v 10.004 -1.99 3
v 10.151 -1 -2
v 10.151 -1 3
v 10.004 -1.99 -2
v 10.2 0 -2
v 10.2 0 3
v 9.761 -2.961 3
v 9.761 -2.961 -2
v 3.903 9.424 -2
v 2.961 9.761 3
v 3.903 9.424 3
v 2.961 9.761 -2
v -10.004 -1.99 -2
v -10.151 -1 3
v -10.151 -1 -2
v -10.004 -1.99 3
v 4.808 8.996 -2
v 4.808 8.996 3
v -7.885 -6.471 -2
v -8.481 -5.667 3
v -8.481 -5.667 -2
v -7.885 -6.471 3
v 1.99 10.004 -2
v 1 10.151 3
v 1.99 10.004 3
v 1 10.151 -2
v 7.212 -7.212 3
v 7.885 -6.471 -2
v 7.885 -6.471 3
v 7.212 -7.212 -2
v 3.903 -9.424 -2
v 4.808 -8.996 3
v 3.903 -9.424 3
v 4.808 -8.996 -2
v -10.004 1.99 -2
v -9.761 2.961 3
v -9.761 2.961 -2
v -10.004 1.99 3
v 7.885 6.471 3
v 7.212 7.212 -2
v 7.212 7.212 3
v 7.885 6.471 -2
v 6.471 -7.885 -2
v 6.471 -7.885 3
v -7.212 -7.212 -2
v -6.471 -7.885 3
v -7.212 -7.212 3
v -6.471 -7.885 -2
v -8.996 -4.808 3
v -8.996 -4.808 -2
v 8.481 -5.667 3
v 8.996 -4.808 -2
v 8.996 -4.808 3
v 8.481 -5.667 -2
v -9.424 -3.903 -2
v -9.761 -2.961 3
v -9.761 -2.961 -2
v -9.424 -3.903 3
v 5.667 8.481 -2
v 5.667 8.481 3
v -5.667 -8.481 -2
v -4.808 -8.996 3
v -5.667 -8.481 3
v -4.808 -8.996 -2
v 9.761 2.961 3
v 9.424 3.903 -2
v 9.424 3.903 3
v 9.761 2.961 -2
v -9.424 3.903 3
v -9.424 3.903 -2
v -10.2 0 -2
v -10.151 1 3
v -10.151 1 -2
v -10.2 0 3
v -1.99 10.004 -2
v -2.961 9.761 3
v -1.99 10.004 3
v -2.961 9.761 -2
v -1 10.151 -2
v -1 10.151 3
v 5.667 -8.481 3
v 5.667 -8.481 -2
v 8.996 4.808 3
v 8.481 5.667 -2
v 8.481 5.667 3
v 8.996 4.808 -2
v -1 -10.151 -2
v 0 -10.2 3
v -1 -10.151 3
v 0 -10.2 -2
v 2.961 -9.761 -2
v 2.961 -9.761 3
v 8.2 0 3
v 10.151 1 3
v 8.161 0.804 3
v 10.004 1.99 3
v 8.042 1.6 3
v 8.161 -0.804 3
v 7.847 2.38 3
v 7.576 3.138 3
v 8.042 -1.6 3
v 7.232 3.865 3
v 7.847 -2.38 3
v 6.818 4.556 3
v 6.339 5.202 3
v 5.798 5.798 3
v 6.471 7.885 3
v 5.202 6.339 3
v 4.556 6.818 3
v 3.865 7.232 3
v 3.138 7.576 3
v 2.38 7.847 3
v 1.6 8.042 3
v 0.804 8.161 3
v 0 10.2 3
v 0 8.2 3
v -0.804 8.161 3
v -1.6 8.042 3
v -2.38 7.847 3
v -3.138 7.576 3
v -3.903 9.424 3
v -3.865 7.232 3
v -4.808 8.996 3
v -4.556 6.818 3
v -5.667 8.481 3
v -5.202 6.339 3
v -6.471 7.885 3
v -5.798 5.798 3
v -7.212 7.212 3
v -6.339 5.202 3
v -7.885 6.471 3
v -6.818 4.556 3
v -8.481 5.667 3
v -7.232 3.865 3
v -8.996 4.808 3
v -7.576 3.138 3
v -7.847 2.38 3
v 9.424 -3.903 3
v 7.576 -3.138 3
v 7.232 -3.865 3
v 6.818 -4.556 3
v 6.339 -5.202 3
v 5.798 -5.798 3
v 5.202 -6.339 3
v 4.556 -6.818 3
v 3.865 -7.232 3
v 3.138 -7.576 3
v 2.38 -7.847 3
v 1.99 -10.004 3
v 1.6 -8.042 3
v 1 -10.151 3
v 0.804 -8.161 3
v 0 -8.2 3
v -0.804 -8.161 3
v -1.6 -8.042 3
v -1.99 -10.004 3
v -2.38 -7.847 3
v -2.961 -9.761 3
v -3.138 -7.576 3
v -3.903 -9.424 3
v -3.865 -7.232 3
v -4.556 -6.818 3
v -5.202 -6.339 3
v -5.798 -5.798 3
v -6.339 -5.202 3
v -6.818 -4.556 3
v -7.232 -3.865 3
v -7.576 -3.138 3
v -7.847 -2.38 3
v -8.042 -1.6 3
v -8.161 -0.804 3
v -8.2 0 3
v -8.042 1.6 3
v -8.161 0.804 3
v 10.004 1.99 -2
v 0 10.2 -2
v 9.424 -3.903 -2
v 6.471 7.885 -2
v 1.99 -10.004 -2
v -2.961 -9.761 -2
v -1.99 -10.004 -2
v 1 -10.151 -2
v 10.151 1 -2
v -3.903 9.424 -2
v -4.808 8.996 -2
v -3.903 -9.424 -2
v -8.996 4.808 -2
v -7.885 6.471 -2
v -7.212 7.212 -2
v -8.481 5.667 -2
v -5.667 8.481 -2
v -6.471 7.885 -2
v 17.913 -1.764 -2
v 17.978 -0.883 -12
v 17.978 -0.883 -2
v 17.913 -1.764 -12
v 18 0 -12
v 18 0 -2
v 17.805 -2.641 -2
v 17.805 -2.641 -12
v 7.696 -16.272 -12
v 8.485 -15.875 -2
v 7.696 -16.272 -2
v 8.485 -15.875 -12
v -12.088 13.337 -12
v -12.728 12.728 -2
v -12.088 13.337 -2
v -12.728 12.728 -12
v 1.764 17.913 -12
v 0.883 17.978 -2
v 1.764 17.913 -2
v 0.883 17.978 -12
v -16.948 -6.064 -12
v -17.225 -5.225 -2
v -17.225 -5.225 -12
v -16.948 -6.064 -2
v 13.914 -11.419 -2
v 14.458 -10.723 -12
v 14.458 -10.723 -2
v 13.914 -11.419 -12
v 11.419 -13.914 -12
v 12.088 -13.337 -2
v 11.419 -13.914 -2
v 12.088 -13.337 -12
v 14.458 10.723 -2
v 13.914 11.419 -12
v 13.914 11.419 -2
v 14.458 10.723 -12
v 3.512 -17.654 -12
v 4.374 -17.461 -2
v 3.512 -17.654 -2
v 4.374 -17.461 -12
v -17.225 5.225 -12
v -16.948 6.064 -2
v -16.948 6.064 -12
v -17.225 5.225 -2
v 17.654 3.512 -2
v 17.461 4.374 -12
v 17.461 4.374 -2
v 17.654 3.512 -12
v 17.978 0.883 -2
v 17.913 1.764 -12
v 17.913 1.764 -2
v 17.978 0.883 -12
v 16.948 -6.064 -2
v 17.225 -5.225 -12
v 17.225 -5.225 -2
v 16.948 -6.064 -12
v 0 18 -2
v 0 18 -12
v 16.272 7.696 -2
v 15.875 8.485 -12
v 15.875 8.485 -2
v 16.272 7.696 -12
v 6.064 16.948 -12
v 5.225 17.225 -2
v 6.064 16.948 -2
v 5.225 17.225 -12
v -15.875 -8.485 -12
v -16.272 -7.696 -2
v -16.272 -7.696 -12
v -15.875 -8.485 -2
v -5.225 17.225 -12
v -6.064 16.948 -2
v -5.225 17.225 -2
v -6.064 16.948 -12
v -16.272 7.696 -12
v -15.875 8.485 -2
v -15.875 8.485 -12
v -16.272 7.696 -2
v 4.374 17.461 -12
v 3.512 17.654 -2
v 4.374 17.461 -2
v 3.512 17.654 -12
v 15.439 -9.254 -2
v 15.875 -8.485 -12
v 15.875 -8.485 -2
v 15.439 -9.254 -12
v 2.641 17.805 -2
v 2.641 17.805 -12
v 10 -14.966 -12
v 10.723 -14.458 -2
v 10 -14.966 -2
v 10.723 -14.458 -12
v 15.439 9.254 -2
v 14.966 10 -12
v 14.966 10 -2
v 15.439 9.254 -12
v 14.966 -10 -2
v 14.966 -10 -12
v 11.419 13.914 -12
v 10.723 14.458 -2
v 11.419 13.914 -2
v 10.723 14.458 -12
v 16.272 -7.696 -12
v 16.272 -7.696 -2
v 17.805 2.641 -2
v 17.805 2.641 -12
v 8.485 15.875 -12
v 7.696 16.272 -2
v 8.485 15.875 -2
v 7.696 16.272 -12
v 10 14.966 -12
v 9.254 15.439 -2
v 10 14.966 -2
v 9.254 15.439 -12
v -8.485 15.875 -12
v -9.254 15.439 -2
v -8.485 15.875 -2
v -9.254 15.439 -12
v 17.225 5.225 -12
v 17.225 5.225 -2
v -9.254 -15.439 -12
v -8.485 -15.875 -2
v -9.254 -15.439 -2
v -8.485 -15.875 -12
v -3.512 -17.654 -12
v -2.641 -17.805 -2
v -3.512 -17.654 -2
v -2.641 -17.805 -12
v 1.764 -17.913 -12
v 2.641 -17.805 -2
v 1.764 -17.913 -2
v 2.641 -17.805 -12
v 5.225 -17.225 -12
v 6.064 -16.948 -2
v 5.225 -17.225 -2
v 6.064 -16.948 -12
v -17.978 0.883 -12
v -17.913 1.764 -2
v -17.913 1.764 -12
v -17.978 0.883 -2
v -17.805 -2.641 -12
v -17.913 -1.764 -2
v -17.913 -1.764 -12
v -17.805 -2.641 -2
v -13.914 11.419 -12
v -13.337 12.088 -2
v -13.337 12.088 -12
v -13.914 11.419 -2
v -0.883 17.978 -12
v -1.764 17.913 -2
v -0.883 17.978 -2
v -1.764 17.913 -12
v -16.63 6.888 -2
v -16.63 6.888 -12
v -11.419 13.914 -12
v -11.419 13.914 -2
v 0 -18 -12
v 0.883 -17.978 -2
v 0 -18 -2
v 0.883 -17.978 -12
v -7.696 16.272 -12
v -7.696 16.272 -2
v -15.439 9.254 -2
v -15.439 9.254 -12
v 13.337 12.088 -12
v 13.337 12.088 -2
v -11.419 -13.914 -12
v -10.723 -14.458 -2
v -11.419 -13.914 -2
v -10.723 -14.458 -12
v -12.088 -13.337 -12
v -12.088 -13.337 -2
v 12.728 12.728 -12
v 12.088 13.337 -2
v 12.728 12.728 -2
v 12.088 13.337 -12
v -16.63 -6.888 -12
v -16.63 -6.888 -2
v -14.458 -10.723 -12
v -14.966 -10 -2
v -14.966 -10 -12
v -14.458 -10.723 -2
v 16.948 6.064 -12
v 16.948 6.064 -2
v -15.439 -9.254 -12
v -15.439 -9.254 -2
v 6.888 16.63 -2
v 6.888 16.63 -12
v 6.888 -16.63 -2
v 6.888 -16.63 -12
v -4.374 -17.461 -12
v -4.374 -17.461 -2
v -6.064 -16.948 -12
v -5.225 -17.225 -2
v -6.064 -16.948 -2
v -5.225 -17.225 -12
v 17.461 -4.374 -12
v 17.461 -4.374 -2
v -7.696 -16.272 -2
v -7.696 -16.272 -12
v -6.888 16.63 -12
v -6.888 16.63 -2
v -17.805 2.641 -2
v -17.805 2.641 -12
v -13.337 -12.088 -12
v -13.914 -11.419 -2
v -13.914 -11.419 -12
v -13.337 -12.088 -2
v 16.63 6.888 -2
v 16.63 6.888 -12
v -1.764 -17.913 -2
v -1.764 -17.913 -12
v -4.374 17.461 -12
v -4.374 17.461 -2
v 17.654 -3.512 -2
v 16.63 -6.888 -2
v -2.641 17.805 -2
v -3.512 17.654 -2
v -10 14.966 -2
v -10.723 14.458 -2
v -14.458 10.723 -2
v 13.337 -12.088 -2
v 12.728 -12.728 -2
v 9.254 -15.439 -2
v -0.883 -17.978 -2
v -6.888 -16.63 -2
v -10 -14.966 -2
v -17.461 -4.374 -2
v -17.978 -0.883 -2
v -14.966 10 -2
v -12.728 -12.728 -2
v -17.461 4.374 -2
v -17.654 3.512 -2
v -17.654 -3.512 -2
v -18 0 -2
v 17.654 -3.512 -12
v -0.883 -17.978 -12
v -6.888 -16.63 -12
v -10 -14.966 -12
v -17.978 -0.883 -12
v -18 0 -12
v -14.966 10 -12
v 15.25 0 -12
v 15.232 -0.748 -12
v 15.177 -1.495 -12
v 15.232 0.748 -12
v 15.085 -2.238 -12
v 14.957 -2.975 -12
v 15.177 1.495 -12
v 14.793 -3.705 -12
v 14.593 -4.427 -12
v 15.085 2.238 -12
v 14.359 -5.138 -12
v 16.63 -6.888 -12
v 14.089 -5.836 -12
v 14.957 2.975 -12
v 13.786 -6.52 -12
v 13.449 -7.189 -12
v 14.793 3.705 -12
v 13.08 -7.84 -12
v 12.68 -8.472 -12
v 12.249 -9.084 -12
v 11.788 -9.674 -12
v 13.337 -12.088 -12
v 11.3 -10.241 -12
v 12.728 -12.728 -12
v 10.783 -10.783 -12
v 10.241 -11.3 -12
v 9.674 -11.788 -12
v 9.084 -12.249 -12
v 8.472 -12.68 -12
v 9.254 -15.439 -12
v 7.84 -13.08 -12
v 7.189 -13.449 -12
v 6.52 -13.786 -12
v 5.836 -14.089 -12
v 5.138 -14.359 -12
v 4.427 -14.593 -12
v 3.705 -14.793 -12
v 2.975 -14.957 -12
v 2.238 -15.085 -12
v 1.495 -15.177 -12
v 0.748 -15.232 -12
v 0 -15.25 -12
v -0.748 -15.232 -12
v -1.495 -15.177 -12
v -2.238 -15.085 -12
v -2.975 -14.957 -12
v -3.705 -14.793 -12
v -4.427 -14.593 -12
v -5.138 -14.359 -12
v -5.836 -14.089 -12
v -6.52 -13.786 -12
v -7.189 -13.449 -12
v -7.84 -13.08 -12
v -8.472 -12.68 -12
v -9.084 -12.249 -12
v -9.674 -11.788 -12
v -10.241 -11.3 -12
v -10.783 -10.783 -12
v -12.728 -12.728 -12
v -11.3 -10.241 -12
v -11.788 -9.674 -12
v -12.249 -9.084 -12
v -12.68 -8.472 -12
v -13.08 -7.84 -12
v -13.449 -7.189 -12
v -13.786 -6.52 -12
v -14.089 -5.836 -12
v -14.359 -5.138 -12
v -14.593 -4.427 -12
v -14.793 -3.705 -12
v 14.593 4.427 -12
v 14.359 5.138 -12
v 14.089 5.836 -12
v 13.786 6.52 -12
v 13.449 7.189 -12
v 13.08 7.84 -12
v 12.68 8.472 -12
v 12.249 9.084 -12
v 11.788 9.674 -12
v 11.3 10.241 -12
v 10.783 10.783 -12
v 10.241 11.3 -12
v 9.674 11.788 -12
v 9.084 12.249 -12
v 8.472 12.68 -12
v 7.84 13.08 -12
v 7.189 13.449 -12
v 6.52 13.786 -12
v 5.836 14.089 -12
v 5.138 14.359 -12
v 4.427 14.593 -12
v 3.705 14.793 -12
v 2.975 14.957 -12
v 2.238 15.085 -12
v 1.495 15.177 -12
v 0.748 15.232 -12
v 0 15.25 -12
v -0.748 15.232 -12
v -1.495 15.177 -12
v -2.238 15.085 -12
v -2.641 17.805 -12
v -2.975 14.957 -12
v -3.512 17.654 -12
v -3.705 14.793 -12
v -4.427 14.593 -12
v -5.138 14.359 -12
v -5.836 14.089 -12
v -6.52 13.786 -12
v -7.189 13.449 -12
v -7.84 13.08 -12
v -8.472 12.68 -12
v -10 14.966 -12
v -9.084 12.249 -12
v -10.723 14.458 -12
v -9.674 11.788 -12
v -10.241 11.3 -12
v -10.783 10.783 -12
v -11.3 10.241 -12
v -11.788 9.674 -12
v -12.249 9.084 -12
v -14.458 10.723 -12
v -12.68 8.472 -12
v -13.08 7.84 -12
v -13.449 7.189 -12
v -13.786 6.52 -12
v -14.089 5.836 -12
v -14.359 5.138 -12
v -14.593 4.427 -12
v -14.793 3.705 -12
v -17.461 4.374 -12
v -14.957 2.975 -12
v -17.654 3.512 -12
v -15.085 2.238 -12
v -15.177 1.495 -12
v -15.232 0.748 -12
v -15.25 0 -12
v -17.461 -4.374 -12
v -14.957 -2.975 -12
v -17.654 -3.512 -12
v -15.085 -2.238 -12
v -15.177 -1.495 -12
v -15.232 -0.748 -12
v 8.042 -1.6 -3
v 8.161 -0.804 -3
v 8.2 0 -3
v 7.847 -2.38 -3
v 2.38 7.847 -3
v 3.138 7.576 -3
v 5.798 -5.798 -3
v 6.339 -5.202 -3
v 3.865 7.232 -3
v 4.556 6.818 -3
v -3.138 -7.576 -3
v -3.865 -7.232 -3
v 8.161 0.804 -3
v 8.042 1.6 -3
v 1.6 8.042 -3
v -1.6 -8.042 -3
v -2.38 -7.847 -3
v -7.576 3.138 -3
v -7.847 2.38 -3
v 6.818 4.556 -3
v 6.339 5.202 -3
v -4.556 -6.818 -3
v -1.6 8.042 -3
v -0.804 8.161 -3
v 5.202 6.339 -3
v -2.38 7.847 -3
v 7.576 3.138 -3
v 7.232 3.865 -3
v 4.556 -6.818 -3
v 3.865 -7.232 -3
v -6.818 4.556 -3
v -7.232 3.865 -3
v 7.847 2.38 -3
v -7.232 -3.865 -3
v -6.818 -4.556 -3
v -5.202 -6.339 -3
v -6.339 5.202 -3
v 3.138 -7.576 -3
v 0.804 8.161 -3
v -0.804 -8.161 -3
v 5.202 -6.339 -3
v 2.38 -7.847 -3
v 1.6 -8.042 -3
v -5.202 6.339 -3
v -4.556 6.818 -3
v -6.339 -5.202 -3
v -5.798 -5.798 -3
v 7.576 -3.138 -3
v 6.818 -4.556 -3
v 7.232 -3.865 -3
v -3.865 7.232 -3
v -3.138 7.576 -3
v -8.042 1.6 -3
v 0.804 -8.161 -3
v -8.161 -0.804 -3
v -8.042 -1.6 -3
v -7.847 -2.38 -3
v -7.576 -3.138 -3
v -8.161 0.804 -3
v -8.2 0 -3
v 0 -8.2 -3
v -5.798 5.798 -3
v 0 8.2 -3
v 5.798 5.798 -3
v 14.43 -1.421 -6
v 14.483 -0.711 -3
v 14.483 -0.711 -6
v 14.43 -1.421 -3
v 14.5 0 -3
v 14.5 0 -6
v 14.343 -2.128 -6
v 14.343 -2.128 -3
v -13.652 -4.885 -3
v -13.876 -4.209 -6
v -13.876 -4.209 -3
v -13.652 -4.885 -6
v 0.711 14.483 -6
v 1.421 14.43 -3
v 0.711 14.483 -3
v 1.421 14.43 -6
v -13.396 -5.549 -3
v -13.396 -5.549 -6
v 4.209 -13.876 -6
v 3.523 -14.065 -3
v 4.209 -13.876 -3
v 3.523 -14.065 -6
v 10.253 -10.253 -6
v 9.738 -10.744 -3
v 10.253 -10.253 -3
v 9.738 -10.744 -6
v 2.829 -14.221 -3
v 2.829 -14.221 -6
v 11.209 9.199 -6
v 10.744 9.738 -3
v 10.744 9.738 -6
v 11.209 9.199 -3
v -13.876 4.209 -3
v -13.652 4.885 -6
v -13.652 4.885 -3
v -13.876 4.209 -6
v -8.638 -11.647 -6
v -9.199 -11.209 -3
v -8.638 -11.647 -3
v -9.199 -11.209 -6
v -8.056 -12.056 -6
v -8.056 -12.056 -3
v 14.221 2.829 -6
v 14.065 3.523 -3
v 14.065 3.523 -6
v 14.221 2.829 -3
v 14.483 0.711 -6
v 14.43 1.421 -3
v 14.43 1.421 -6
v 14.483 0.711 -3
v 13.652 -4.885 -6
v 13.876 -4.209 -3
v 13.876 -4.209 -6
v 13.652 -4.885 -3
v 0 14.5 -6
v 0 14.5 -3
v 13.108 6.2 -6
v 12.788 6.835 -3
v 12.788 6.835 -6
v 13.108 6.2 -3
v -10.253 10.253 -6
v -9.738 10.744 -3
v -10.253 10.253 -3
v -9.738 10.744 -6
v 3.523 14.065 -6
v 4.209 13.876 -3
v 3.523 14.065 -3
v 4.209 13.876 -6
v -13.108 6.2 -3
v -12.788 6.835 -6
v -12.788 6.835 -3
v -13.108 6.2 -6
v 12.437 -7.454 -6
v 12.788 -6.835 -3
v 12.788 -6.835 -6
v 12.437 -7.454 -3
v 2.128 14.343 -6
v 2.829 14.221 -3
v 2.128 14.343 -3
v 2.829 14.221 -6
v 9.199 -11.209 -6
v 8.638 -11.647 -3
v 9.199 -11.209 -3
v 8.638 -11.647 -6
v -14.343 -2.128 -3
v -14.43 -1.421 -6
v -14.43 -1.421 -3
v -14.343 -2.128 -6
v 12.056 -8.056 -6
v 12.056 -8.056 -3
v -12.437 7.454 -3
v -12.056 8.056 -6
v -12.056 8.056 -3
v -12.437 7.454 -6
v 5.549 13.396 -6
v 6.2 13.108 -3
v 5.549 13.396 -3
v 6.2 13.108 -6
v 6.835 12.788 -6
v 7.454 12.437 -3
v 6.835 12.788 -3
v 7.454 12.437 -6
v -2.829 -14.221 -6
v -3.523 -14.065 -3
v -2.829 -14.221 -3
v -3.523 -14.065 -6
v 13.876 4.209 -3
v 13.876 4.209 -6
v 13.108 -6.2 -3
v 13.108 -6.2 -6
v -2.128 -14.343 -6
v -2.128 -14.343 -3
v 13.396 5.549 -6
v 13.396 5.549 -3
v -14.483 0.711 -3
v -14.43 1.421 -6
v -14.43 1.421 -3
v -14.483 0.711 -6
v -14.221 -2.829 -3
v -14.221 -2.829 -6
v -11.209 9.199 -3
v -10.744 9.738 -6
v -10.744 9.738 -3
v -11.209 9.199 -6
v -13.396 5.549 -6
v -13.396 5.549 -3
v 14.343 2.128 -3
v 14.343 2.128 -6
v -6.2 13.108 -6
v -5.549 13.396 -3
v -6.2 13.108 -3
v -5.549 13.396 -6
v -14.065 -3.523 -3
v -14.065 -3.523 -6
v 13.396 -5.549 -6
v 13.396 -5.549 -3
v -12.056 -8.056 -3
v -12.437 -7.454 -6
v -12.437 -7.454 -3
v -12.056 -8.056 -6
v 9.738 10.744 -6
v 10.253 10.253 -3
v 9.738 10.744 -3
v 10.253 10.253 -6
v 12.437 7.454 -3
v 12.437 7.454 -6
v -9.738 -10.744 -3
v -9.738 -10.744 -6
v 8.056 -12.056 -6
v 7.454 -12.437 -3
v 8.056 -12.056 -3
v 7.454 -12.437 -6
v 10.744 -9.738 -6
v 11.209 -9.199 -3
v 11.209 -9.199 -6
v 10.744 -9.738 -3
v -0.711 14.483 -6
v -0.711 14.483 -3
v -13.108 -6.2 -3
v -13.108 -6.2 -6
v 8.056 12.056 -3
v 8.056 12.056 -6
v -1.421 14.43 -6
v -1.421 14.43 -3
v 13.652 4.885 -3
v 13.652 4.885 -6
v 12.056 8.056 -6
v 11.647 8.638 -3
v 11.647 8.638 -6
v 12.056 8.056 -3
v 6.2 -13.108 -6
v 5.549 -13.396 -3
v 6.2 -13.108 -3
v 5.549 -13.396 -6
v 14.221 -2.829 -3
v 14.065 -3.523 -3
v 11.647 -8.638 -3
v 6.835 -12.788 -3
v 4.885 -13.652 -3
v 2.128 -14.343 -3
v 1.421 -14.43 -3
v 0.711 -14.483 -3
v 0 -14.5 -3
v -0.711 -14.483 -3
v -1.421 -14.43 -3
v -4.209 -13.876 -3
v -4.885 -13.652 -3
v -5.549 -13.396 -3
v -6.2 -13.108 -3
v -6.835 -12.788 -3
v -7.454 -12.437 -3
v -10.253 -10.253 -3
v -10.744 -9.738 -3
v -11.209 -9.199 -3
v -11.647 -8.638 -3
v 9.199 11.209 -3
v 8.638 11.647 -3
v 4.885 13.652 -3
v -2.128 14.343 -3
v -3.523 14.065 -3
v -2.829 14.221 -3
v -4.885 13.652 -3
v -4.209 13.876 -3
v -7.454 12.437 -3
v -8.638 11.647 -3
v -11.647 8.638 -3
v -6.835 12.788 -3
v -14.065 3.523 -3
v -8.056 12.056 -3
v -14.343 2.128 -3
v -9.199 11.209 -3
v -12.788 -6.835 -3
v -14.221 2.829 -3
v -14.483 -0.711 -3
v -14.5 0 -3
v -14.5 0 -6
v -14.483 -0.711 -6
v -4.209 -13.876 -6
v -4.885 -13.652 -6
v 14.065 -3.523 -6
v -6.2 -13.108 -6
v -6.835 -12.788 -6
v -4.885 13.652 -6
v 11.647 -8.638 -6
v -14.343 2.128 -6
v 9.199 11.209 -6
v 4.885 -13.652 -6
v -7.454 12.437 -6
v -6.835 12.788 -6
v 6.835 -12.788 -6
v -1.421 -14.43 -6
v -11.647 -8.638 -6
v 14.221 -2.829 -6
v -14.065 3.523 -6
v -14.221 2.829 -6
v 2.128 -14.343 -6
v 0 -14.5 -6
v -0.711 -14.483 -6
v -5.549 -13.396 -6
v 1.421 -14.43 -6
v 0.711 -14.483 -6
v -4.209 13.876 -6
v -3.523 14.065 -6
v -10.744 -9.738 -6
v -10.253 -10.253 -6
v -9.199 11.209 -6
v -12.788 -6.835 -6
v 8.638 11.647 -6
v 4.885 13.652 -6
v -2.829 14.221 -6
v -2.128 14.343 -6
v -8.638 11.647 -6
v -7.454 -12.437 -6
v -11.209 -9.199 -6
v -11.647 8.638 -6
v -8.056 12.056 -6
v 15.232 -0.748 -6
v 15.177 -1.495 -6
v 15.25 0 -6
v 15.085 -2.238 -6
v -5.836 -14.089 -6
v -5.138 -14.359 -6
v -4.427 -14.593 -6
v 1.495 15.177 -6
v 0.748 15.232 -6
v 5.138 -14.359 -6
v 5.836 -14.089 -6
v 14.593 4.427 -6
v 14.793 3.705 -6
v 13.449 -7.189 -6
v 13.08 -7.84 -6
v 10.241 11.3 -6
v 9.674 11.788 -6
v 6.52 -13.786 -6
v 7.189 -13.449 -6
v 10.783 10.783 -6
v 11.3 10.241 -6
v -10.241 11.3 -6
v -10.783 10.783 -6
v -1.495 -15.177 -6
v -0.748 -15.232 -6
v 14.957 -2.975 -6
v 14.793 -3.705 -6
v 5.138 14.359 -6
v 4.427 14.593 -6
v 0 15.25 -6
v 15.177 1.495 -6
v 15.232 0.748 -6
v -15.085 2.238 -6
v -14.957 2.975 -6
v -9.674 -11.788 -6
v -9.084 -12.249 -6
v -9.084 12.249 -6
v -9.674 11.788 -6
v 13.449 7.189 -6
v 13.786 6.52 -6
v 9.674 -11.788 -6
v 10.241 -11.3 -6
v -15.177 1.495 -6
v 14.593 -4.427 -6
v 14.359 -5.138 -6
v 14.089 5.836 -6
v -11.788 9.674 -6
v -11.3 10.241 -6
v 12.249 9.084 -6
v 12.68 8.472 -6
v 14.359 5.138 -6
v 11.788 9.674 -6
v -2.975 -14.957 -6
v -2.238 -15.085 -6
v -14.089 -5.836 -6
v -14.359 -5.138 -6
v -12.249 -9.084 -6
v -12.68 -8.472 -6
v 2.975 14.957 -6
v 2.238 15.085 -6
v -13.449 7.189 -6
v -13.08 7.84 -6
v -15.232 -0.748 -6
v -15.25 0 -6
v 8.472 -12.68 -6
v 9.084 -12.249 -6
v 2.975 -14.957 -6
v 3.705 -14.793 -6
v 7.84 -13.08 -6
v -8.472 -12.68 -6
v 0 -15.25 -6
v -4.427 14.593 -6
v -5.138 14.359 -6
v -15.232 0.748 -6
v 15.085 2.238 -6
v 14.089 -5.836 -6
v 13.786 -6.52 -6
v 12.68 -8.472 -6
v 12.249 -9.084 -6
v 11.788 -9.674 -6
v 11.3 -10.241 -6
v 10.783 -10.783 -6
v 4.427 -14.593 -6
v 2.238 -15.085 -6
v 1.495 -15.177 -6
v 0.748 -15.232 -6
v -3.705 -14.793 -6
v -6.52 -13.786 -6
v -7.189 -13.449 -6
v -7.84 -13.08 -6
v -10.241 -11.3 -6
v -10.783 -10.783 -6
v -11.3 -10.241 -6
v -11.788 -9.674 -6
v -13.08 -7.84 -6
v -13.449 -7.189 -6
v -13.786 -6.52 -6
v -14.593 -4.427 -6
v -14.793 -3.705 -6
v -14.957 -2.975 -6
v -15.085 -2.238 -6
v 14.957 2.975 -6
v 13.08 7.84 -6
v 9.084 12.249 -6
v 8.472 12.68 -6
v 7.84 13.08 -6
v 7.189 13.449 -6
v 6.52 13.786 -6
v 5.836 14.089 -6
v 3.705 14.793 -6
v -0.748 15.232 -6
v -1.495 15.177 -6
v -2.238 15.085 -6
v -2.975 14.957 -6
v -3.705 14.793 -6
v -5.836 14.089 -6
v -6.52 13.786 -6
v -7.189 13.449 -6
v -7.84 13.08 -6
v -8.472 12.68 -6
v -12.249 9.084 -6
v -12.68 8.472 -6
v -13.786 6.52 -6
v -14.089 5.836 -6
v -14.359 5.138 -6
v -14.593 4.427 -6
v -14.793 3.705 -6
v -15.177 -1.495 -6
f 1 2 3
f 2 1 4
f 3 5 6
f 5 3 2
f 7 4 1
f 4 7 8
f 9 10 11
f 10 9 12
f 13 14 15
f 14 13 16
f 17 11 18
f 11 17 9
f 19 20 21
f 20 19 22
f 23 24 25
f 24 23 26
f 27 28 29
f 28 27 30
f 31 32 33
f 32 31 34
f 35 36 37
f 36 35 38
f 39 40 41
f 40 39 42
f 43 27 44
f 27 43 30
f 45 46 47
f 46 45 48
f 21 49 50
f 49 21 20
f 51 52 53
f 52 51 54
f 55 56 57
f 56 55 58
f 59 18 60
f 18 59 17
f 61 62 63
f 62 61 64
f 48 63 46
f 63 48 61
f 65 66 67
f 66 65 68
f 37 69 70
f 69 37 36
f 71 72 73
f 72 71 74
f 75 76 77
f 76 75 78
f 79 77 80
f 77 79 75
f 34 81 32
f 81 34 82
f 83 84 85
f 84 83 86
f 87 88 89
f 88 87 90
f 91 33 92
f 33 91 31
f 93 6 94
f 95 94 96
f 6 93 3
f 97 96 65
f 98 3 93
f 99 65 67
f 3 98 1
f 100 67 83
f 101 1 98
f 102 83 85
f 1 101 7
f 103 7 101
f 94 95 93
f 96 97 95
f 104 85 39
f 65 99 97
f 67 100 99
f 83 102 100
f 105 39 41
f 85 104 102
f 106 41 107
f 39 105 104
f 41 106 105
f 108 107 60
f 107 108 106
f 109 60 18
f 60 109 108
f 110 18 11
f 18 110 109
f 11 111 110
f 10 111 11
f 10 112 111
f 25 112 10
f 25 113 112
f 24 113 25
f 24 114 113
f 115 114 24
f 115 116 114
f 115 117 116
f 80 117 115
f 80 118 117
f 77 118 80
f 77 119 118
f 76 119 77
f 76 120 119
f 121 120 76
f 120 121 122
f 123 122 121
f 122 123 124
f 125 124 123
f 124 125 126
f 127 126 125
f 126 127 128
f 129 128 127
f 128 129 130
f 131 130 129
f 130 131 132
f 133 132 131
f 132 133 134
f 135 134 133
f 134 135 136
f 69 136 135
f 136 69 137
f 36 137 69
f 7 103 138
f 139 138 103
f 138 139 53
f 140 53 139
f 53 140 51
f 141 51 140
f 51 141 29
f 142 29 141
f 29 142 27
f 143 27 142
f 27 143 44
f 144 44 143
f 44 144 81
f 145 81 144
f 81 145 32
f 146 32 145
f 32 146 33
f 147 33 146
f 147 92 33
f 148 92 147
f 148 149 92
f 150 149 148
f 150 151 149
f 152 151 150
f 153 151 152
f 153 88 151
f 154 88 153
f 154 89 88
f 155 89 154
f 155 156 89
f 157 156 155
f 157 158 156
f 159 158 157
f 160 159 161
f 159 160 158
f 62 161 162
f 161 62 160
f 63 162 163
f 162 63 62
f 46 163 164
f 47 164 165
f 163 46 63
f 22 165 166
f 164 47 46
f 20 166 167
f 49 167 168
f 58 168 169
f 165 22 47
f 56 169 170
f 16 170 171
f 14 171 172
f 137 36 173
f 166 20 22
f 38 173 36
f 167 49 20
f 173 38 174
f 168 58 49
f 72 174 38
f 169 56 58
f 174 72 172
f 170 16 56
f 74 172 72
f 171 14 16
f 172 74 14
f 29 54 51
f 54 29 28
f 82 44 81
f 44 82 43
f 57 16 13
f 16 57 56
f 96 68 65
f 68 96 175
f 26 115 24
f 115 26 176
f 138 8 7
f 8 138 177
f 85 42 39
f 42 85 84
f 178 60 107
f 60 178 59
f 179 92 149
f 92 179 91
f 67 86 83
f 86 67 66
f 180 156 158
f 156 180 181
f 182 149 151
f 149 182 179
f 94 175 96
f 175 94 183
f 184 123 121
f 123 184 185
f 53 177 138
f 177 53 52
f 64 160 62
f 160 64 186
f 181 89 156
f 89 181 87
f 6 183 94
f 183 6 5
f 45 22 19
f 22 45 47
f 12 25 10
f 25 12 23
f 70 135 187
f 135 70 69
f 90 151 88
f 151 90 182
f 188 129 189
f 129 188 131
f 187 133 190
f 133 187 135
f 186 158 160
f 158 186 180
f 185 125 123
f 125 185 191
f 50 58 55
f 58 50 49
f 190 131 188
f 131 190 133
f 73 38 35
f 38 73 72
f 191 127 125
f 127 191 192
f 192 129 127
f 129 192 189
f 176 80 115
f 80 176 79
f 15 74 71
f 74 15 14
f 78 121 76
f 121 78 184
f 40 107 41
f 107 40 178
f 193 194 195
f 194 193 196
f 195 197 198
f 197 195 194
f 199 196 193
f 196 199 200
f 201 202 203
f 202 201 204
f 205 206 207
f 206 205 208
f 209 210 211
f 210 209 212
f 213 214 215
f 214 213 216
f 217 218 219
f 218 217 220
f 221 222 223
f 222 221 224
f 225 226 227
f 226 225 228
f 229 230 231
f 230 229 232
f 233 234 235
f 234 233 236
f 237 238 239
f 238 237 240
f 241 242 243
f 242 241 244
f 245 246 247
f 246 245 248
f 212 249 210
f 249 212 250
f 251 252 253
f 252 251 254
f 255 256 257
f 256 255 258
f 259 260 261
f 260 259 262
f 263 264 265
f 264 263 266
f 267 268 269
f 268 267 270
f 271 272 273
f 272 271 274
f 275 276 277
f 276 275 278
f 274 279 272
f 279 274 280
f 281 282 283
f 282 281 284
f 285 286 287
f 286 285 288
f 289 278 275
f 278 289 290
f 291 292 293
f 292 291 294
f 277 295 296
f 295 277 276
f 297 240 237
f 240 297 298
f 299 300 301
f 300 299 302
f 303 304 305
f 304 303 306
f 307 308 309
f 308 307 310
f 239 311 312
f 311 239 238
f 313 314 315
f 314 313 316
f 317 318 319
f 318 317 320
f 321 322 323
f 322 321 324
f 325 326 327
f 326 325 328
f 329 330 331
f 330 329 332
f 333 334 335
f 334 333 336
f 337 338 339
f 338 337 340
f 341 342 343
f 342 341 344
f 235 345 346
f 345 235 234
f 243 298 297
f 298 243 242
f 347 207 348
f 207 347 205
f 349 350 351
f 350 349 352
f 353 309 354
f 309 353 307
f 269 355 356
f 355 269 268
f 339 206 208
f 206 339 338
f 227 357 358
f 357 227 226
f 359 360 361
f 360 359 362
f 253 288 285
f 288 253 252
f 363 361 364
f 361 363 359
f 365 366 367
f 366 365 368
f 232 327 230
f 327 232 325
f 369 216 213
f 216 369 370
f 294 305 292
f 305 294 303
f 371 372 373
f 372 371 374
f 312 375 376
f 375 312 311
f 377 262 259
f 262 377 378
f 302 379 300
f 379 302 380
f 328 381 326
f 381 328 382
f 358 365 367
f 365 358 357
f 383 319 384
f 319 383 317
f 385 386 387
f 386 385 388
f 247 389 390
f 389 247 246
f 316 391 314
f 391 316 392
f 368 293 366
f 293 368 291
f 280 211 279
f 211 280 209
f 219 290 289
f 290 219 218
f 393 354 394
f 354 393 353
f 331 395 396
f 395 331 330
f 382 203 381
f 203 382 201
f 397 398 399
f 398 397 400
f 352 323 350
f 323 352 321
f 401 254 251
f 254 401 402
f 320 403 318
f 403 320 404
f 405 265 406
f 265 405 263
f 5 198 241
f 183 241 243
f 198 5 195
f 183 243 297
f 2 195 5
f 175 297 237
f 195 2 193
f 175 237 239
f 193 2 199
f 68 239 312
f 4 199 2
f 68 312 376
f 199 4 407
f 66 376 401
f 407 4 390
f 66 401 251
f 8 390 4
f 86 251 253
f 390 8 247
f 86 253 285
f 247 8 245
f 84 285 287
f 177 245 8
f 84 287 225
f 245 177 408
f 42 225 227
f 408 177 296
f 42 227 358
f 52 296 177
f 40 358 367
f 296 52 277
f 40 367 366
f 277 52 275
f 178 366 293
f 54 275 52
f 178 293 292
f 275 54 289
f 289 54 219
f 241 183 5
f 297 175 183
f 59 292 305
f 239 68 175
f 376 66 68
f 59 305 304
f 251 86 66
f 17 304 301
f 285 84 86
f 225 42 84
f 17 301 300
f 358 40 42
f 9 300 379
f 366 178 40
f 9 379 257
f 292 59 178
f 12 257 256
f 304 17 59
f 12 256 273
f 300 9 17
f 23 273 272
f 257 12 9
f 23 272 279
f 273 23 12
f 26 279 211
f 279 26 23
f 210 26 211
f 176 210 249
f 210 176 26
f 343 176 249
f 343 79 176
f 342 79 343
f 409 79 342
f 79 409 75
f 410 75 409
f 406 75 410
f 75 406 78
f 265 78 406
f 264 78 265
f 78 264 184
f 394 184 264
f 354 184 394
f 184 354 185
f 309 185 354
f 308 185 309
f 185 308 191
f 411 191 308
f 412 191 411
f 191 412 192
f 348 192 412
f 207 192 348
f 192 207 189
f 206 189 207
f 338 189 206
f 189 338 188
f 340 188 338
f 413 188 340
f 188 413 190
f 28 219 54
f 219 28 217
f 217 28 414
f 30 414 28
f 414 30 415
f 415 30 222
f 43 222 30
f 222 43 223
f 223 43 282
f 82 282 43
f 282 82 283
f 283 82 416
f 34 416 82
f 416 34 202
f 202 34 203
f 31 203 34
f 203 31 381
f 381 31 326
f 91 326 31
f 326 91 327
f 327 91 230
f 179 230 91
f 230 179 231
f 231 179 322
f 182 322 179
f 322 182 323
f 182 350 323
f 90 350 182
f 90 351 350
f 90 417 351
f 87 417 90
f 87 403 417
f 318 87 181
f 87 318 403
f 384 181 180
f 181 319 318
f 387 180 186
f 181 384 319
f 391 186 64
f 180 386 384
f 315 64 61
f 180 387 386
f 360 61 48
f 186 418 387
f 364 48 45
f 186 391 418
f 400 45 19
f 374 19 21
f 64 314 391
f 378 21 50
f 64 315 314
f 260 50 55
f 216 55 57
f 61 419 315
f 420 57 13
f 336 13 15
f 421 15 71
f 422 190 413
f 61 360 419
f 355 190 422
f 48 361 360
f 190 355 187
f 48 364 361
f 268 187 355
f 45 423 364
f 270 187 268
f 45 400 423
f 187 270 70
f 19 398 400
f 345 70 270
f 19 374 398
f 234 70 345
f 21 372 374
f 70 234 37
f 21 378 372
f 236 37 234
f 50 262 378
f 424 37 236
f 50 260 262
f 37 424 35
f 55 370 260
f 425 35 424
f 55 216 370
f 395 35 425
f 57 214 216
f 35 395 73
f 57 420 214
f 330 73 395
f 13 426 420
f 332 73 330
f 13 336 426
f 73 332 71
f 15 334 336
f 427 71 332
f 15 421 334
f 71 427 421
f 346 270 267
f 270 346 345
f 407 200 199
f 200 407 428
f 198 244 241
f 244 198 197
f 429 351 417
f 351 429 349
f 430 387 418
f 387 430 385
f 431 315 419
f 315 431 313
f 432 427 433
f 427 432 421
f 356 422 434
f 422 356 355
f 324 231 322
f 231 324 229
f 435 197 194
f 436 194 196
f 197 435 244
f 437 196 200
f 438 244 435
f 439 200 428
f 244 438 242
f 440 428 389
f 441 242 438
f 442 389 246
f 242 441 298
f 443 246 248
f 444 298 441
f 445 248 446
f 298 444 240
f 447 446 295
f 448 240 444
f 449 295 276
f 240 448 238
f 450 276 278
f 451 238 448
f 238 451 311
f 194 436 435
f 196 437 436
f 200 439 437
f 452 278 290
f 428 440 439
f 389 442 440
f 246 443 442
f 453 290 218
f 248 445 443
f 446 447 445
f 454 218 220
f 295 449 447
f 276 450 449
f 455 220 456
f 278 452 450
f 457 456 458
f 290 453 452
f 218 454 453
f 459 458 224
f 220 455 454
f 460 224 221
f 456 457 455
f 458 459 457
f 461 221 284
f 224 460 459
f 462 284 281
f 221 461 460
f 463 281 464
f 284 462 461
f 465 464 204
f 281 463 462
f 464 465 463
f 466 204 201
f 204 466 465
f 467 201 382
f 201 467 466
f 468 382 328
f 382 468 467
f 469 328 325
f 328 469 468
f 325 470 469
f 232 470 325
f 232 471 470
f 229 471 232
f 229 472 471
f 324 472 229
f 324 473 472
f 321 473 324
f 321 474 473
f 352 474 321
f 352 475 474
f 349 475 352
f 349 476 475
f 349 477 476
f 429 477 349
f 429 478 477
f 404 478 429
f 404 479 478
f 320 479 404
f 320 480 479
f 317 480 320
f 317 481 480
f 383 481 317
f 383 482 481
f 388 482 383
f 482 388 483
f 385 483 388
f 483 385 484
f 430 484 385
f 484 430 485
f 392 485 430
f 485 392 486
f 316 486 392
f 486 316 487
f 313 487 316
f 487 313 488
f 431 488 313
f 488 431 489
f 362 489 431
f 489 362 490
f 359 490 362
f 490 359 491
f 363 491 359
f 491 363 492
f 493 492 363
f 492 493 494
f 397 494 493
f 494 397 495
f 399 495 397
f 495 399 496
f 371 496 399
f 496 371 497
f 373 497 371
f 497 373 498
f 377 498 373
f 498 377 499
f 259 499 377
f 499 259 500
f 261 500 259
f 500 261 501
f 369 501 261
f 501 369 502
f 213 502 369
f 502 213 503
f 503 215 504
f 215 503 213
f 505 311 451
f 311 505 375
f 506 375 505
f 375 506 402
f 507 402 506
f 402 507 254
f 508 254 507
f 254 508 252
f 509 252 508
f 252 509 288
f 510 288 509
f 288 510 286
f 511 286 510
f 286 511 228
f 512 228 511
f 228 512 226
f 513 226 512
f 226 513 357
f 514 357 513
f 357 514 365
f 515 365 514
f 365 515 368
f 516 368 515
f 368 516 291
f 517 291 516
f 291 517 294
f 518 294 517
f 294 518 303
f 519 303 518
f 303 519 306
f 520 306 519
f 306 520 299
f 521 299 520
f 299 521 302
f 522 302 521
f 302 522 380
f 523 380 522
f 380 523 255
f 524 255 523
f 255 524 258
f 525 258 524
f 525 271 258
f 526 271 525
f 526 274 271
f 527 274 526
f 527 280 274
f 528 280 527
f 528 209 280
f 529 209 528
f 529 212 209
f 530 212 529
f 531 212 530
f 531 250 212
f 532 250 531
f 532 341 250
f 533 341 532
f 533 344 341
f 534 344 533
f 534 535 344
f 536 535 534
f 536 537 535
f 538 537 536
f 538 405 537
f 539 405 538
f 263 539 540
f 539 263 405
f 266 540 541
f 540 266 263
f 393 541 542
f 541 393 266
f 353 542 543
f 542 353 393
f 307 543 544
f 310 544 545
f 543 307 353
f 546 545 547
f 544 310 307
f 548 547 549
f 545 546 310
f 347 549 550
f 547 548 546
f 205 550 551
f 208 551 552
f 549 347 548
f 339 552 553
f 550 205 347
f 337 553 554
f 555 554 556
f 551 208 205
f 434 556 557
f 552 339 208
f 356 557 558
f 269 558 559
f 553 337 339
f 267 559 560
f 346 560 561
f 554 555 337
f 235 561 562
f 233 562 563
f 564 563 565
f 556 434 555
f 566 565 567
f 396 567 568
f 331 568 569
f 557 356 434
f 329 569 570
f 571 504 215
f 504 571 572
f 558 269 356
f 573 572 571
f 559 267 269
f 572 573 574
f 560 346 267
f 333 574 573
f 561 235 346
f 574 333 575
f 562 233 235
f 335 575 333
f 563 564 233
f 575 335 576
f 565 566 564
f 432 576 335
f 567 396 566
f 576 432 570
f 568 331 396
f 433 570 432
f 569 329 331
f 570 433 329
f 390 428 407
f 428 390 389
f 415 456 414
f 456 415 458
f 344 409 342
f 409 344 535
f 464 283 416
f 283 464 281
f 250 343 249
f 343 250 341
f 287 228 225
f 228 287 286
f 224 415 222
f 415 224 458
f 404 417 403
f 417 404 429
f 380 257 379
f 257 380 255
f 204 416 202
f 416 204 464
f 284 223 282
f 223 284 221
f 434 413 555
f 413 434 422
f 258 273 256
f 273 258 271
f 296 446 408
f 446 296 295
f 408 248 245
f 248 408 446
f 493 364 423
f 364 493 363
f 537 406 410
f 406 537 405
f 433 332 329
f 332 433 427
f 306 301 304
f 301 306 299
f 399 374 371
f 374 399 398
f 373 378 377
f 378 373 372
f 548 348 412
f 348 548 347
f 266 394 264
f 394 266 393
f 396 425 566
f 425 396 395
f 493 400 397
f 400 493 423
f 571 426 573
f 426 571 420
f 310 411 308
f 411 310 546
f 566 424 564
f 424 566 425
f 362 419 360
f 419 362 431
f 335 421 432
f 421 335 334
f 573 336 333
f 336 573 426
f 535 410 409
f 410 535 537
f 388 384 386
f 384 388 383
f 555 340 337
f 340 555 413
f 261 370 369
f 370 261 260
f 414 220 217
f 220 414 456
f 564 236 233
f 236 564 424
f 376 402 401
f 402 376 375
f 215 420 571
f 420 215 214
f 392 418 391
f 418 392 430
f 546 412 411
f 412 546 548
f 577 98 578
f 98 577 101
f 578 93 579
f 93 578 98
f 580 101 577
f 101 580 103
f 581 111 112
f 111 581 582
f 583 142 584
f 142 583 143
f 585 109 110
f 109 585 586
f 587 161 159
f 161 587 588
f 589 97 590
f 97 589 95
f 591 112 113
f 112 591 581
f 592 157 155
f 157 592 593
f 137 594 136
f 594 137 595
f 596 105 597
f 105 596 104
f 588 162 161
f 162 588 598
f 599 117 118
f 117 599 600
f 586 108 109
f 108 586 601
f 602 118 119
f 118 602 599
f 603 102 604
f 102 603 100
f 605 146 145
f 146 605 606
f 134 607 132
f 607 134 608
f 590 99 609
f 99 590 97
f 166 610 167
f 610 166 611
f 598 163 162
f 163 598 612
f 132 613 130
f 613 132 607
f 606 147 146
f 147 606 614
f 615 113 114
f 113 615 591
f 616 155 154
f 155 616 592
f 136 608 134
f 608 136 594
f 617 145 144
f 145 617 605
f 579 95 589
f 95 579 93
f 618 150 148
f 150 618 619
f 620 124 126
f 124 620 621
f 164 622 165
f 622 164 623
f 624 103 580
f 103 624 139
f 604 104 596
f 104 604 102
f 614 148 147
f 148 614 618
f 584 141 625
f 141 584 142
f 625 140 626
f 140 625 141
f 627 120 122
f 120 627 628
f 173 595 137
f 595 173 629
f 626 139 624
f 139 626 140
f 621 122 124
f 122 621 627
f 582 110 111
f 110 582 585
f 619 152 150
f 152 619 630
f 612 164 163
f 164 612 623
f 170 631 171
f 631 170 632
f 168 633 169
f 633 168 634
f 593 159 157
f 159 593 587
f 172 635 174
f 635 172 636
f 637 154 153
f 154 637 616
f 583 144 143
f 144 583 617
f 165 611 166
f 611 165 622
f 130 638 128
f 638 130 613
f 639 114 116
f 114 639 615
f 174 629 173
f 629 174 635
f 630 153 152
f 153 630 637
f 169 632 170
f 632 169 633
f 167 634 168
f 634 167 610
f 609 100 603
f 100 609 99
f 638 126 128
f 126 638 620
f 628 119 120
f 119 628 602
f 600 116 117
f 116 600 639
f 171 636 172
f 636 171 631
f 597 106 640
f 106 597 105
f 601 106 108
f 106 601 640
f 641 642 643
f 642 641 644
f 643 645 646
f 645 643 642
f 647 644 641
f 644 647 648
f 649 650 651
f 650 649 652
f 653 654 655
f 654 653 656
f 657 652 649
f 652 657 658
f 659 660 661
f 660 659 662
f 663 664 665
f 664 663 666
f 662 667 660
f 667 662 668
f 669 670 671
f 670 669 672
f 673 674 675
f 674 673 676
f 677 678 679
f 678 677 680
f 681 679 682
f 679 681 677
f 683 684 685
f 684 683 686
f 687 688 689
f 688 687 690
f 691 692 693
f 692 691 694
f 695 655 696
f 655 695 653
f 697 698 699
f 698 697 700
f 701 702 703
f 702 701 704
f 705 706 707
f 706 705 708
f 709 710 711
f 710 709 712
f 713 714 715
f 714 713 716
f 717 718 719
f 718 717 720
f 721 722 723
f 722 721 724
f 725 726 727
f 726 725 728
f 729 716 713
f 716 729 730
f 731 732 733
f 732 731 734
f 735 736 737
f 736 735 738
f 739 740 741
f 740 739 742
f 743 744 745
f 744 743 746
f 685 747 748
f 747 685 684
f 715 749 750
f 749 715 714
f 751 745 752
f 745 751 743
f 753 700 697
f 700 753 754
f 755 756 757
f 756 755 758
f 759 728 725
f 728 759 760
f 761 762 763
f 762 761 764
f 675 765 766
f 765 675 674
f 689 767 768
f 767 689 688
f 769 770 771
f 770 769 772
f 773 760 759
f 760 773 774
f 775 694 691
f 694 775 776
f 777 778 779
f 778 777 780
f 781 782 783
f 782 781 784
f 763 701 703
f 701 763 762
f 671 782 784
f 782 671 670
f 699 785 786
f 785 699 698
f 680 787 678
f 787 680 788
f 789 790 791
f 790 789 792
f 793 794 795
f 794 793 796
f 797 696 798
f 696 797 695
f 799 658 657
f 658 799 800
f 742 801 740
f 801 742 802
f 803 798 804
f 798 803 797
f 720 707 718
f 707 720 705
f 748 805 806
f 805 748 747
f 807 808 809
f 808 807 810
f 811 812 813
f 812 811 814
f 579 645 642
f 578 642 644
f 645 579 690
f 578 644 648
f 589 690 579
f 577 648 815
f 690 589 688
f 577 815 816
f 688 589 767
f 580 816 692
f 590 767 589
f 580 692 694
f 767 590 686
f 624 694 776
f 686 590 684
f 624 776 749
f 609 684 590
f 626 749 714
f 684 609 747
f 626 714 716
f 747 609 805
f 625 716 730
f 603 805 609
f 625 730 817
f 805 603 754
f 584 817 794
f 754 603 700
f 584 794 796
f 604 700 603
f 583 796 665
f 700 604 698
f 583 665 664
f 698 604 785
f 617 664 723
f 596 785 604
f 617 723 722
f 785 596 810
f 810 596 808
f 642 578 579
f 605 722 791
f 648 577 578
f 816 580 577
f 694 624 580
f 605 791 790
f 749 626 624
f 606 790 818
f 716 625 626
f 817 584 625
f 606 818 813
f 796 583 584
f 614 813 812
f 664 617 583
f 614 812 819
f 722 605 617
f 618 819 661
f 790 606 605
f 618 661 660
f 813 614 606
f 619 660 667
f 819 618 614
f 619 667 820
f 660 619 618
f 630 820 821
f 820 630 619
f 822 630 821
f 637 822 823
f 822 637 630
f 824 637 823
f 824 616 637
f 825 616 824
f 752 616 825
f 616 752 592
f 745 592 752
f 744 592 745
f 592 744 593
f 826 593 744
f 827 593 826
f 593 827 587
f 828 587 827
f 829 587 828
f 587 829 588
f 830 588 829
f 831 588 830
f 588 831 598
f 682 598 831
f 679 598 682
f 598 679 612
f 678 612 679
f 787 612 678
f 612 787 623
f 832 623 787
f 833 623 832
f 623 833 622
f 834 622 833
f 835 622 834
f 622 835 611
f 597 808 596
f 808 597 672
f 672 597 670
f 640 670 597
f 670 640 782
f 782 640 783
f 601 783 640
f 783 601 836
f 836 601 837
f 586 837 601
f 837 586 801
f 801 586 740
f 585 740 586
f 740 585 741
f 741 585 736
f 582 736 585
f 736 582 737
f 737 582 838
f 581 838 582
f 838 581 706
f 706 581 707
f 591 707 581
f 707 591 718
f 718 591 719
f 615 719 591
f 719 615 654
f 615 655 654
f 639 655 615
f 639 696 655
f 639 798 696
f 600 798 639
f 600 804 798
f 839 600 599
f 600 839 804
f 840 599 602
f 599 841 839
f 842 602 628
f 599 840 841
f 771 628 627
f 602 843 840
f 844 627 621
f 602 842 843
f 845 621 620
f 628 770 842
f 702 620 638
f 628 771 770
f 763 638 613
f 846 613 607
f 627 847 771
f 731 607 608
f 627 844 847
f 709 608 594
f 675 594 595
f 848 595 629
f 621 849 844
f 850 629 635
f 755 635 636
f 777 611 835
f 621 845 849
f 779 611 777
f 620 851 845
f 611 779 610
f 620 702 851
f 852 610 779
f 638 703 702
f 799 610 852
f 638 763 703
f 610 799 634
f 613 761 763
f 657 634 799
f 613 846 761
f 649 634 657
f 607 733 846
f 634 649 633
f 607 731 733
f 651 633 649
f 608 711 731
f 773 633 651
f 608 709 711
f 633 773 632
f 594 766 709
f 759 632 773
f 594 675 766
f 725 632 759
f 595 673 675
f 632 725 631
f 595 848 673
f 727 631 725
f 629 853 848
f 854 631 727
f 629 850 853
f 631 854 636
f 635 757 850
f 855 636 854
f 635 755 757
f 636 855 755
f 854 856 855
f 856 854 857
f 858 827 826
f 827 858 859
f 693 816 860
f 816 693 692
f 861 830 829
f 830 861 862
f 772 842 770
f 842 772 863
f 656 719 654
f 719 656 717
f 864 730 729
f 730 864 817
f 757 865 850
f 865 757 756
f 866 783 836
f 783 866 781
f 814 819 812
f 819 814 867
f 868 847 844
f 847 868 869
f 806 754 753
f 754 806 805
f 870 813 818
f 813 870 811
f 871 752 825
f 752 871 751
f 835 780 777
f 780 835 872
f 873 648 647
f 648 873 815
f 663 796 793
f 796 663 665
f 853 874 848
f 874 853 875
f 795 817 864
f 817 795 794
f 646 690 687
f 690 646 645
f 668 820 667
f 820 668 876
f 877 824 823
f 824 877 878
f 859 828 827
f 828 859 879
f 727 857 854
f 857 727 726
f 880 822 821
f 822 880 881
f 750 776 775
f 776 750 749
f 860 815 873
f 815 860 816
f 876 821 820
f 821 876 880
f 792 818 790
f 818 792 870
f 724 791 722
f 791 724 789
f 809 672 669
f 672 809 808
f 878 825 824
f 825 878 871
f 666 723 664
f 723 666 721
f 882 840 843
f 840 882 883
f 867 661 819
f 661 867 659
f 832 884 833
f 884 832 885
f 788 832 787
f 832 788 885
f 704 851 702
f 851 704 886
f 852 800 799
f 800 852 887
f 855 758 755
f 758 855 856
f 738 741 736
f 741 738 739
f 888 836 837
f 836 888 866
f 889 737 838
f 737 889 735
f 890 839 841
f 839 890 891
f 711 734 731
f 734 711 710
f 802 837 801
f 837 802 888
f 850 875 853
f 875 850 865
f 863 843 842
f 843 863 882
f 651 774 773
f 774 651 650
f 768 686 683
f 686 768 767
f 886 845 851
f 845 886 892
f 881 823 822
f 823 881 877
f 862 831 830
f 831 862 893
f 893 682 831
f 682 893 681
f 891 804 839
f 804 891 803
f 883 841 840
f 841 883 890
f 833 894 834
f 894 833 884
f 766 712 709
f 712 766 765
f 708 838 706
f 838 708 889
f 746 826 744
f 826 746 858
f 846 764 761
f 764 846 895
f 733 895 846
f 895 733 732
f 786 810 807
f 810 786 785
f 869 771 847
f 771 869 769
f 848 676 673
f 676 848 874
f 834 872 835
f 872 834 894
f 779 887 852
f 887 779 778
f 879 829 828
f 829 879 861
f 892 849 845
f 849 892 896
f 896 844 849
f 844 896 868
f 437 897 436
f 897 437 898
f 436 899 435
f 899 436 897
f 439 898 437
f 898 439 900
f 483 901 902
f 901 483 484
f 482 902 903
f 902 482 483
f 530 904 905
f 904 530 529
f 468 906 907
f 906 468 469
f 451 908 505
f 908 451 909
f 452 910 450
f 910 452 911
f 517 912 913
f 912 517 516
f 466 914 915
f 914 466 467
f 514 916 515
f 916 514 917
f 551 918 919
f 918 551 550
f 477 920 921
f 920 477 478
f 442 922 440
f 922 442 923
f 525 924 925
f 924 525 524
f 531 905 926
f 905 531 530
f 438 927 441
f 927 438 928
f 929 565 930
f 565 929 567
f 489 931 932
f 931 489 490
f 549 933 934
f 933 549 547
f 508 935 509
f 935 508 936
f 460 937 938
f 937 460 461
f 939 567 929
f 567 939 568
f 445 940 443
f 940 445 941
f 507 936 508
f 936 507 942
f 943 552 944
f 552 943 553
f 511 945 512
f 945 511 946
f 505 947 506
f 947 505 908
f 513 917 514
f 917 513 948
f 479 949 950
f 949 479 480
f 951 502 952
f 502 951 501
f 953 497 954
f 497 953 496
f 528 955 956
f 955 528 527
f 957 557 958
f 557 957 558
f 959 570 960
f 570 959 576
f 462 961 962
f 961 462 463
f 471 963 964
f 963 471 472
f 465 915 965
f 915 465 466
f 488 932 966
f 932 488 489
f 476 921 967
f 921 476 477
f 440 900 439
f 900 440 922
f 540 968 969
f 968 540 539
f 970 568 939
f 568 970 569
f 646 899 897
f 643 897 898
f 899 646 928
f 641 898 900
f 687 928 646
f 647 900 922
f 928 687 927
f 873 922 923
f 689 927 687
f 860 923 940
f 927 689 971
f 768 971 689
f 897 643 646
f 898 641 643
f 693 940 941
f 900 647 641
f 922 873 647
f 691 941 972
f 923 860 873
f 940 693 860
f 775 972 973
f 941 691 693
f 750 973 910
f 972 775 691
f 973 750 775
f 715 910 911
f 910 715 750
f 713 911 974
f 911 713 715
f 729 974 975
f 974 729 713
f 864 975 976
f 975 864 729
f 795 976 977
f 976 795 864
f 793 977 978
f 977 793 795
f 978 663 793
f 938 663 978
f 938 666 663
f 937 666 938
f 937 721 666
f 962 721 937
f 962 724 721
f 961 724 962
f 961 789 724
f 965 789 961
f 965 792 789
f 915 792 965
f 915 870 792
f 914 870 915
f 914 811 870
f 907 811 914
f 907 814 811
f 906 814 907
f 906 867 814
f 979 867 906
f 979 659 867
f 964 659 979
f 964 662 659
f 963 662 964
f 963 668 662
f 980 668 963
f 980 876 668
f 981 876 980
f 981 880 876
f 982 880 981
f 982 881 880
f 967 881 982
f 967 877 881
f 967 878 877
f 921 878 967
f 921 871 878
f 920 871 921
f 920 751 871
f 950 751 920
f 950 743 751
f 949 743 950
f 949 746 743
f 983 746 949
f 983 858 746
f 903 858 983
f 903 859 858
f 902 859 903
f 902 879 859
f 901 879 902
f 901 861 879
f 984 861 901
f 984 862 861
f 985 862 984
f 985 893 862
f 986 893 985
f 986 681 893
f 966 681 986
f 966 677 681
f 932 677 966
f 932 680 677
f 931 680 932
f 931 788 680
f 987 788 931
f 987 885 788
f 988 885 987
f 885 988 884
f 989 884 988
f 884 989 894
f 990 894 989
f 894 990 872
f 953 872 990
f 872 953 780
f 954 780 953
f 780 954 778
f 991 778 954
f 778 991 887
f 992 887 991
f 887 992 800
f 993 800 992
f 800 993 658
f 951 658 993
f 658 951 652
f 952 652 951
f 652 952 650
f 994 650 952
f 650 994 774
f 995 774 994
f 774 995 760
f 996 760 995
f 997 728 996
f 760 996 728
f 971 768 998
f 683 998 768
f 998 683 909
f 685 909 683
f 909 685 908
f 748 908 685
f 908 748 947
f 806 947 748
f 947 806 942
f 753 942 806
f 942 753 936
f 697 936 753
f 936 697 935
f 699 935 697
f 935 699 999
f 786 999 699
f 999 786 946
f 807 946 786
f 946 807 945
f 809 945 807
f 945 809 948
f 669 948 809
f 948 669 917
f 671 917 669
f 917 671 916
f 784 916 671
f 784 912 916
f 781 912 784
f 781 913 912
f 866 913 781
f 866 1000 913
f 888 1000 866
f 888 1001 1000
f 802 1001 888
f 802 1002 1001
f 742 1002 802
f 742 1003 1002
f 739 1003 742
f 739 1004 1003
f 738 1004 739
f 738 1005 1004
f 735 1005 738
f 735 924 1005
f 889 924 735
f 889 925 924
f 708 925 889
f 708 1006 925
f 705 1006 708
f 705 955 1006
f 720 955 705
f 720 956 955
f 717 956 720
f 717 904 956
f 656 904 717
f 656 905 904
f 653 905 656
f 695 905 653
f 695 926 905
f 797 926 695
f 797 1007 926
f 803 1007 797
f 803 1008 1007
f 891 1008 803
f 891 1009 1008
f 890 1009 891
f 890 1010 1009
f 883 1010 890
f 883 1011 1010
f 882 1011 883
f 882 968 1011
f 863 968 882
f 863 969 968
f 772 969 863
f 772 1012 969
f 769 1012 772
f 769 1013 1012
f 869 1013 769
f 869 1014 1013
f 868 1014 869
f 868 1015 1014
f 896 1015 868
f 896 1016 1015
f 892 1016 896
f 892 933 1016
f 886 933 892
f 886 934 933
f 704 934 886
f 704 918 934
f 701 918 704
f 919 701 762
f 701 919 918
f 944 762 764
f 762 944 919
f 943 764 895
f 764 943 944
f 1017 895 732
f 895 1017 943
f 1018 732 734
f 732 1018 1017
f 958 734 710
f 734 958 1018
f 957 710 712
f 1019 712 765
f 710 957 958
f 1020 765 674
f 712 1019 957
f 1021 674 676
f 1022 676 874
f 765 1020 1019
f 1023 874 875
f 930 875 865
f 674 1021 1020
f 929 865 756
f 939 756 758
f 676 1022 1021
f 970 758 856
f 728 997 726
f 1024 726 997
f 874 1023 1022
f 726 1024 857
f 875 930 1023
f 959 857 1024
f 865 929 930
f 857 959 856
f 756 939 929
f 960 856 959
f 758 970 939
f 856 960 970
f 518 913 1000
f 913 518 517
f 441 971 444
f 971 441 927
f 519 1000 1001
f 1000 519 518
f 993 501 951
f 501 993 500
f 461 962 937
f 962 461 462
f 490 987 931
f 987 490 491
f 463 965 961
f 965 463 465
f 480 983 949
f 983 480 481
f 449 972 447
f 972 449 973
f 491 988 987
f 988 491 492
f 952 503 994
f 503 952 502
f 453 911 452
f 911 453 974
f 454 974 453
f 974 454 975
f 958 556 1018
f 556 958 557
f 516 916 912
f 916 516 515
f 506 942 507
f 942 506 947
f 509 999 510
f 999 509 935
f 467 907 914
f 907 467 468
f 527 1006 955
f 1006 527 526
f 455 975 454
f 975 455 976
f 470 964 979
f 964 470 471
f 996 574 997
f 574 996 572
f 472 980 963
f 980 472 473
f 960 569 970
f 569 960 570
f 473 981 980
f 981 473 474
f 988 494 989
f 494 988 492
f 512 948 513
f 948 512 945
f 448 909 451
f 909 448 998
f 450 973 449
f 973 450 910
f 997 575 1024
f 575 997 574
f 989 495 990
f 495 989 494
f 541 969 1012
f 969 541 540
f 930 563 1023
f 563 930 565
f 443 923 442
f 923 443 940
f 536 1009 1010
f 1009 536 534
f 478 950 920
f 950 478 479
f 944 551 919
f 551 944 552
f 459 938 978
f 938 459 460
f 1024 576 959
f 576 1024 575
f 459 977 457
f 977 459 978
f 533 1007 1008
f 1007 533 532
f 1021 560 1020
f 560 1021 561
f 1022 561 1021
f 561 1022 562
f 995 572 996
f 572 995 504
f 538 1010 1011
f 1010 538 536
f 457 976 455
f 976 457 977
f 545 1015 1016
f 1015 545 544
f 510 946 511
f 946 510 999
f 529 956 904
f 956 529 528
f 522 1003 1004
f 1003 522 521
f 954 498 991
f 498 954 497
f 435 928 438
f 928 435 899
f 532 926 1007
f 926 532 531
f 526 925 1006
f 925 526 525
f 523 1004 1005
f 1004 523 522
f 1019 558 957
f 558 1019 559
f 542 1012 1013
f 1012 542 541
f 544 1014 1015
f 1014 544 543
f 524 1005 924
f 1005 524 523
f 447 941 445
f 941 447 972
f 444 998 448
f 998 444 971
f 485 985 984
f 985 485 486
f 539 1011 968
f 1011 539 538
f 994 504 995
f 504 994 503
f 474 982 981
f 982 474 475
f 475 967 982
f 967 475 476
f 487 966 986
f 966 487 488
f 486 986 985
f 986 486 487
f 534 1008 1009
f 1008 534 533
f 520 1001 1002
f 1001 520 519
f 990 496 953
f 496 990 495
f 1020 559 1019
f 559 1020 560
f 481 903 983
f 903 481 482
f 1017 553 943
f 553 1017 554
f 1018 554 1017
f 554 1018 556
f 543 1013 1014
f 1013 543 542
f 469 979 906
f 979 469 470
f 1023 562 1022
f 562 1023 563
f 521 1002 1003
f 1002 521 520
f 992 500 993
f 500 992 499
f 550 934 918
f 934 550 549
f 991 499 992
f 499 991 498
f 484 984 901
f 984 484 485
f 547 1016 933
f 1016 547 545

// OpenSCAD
module cap() {
difference() {
  union() {
   cylinder(r=10.2,h=6,center=true,$fn=64);
   translate([0,0,7])
    cylinder(r=18,h=10,center=true,$fn=128);

  }
  cylinder(r=8.2,h=8,center=true,$fn=64);
  translate([0,0,7])
      cylinder(r=14.5,h=8,center=true,$fn=128);
   translate([0,0,10])
      cylinder(r=15.25,h=8,center=true,$fn=128);
}
}

rotate([180,0,0]) 
   cap();
